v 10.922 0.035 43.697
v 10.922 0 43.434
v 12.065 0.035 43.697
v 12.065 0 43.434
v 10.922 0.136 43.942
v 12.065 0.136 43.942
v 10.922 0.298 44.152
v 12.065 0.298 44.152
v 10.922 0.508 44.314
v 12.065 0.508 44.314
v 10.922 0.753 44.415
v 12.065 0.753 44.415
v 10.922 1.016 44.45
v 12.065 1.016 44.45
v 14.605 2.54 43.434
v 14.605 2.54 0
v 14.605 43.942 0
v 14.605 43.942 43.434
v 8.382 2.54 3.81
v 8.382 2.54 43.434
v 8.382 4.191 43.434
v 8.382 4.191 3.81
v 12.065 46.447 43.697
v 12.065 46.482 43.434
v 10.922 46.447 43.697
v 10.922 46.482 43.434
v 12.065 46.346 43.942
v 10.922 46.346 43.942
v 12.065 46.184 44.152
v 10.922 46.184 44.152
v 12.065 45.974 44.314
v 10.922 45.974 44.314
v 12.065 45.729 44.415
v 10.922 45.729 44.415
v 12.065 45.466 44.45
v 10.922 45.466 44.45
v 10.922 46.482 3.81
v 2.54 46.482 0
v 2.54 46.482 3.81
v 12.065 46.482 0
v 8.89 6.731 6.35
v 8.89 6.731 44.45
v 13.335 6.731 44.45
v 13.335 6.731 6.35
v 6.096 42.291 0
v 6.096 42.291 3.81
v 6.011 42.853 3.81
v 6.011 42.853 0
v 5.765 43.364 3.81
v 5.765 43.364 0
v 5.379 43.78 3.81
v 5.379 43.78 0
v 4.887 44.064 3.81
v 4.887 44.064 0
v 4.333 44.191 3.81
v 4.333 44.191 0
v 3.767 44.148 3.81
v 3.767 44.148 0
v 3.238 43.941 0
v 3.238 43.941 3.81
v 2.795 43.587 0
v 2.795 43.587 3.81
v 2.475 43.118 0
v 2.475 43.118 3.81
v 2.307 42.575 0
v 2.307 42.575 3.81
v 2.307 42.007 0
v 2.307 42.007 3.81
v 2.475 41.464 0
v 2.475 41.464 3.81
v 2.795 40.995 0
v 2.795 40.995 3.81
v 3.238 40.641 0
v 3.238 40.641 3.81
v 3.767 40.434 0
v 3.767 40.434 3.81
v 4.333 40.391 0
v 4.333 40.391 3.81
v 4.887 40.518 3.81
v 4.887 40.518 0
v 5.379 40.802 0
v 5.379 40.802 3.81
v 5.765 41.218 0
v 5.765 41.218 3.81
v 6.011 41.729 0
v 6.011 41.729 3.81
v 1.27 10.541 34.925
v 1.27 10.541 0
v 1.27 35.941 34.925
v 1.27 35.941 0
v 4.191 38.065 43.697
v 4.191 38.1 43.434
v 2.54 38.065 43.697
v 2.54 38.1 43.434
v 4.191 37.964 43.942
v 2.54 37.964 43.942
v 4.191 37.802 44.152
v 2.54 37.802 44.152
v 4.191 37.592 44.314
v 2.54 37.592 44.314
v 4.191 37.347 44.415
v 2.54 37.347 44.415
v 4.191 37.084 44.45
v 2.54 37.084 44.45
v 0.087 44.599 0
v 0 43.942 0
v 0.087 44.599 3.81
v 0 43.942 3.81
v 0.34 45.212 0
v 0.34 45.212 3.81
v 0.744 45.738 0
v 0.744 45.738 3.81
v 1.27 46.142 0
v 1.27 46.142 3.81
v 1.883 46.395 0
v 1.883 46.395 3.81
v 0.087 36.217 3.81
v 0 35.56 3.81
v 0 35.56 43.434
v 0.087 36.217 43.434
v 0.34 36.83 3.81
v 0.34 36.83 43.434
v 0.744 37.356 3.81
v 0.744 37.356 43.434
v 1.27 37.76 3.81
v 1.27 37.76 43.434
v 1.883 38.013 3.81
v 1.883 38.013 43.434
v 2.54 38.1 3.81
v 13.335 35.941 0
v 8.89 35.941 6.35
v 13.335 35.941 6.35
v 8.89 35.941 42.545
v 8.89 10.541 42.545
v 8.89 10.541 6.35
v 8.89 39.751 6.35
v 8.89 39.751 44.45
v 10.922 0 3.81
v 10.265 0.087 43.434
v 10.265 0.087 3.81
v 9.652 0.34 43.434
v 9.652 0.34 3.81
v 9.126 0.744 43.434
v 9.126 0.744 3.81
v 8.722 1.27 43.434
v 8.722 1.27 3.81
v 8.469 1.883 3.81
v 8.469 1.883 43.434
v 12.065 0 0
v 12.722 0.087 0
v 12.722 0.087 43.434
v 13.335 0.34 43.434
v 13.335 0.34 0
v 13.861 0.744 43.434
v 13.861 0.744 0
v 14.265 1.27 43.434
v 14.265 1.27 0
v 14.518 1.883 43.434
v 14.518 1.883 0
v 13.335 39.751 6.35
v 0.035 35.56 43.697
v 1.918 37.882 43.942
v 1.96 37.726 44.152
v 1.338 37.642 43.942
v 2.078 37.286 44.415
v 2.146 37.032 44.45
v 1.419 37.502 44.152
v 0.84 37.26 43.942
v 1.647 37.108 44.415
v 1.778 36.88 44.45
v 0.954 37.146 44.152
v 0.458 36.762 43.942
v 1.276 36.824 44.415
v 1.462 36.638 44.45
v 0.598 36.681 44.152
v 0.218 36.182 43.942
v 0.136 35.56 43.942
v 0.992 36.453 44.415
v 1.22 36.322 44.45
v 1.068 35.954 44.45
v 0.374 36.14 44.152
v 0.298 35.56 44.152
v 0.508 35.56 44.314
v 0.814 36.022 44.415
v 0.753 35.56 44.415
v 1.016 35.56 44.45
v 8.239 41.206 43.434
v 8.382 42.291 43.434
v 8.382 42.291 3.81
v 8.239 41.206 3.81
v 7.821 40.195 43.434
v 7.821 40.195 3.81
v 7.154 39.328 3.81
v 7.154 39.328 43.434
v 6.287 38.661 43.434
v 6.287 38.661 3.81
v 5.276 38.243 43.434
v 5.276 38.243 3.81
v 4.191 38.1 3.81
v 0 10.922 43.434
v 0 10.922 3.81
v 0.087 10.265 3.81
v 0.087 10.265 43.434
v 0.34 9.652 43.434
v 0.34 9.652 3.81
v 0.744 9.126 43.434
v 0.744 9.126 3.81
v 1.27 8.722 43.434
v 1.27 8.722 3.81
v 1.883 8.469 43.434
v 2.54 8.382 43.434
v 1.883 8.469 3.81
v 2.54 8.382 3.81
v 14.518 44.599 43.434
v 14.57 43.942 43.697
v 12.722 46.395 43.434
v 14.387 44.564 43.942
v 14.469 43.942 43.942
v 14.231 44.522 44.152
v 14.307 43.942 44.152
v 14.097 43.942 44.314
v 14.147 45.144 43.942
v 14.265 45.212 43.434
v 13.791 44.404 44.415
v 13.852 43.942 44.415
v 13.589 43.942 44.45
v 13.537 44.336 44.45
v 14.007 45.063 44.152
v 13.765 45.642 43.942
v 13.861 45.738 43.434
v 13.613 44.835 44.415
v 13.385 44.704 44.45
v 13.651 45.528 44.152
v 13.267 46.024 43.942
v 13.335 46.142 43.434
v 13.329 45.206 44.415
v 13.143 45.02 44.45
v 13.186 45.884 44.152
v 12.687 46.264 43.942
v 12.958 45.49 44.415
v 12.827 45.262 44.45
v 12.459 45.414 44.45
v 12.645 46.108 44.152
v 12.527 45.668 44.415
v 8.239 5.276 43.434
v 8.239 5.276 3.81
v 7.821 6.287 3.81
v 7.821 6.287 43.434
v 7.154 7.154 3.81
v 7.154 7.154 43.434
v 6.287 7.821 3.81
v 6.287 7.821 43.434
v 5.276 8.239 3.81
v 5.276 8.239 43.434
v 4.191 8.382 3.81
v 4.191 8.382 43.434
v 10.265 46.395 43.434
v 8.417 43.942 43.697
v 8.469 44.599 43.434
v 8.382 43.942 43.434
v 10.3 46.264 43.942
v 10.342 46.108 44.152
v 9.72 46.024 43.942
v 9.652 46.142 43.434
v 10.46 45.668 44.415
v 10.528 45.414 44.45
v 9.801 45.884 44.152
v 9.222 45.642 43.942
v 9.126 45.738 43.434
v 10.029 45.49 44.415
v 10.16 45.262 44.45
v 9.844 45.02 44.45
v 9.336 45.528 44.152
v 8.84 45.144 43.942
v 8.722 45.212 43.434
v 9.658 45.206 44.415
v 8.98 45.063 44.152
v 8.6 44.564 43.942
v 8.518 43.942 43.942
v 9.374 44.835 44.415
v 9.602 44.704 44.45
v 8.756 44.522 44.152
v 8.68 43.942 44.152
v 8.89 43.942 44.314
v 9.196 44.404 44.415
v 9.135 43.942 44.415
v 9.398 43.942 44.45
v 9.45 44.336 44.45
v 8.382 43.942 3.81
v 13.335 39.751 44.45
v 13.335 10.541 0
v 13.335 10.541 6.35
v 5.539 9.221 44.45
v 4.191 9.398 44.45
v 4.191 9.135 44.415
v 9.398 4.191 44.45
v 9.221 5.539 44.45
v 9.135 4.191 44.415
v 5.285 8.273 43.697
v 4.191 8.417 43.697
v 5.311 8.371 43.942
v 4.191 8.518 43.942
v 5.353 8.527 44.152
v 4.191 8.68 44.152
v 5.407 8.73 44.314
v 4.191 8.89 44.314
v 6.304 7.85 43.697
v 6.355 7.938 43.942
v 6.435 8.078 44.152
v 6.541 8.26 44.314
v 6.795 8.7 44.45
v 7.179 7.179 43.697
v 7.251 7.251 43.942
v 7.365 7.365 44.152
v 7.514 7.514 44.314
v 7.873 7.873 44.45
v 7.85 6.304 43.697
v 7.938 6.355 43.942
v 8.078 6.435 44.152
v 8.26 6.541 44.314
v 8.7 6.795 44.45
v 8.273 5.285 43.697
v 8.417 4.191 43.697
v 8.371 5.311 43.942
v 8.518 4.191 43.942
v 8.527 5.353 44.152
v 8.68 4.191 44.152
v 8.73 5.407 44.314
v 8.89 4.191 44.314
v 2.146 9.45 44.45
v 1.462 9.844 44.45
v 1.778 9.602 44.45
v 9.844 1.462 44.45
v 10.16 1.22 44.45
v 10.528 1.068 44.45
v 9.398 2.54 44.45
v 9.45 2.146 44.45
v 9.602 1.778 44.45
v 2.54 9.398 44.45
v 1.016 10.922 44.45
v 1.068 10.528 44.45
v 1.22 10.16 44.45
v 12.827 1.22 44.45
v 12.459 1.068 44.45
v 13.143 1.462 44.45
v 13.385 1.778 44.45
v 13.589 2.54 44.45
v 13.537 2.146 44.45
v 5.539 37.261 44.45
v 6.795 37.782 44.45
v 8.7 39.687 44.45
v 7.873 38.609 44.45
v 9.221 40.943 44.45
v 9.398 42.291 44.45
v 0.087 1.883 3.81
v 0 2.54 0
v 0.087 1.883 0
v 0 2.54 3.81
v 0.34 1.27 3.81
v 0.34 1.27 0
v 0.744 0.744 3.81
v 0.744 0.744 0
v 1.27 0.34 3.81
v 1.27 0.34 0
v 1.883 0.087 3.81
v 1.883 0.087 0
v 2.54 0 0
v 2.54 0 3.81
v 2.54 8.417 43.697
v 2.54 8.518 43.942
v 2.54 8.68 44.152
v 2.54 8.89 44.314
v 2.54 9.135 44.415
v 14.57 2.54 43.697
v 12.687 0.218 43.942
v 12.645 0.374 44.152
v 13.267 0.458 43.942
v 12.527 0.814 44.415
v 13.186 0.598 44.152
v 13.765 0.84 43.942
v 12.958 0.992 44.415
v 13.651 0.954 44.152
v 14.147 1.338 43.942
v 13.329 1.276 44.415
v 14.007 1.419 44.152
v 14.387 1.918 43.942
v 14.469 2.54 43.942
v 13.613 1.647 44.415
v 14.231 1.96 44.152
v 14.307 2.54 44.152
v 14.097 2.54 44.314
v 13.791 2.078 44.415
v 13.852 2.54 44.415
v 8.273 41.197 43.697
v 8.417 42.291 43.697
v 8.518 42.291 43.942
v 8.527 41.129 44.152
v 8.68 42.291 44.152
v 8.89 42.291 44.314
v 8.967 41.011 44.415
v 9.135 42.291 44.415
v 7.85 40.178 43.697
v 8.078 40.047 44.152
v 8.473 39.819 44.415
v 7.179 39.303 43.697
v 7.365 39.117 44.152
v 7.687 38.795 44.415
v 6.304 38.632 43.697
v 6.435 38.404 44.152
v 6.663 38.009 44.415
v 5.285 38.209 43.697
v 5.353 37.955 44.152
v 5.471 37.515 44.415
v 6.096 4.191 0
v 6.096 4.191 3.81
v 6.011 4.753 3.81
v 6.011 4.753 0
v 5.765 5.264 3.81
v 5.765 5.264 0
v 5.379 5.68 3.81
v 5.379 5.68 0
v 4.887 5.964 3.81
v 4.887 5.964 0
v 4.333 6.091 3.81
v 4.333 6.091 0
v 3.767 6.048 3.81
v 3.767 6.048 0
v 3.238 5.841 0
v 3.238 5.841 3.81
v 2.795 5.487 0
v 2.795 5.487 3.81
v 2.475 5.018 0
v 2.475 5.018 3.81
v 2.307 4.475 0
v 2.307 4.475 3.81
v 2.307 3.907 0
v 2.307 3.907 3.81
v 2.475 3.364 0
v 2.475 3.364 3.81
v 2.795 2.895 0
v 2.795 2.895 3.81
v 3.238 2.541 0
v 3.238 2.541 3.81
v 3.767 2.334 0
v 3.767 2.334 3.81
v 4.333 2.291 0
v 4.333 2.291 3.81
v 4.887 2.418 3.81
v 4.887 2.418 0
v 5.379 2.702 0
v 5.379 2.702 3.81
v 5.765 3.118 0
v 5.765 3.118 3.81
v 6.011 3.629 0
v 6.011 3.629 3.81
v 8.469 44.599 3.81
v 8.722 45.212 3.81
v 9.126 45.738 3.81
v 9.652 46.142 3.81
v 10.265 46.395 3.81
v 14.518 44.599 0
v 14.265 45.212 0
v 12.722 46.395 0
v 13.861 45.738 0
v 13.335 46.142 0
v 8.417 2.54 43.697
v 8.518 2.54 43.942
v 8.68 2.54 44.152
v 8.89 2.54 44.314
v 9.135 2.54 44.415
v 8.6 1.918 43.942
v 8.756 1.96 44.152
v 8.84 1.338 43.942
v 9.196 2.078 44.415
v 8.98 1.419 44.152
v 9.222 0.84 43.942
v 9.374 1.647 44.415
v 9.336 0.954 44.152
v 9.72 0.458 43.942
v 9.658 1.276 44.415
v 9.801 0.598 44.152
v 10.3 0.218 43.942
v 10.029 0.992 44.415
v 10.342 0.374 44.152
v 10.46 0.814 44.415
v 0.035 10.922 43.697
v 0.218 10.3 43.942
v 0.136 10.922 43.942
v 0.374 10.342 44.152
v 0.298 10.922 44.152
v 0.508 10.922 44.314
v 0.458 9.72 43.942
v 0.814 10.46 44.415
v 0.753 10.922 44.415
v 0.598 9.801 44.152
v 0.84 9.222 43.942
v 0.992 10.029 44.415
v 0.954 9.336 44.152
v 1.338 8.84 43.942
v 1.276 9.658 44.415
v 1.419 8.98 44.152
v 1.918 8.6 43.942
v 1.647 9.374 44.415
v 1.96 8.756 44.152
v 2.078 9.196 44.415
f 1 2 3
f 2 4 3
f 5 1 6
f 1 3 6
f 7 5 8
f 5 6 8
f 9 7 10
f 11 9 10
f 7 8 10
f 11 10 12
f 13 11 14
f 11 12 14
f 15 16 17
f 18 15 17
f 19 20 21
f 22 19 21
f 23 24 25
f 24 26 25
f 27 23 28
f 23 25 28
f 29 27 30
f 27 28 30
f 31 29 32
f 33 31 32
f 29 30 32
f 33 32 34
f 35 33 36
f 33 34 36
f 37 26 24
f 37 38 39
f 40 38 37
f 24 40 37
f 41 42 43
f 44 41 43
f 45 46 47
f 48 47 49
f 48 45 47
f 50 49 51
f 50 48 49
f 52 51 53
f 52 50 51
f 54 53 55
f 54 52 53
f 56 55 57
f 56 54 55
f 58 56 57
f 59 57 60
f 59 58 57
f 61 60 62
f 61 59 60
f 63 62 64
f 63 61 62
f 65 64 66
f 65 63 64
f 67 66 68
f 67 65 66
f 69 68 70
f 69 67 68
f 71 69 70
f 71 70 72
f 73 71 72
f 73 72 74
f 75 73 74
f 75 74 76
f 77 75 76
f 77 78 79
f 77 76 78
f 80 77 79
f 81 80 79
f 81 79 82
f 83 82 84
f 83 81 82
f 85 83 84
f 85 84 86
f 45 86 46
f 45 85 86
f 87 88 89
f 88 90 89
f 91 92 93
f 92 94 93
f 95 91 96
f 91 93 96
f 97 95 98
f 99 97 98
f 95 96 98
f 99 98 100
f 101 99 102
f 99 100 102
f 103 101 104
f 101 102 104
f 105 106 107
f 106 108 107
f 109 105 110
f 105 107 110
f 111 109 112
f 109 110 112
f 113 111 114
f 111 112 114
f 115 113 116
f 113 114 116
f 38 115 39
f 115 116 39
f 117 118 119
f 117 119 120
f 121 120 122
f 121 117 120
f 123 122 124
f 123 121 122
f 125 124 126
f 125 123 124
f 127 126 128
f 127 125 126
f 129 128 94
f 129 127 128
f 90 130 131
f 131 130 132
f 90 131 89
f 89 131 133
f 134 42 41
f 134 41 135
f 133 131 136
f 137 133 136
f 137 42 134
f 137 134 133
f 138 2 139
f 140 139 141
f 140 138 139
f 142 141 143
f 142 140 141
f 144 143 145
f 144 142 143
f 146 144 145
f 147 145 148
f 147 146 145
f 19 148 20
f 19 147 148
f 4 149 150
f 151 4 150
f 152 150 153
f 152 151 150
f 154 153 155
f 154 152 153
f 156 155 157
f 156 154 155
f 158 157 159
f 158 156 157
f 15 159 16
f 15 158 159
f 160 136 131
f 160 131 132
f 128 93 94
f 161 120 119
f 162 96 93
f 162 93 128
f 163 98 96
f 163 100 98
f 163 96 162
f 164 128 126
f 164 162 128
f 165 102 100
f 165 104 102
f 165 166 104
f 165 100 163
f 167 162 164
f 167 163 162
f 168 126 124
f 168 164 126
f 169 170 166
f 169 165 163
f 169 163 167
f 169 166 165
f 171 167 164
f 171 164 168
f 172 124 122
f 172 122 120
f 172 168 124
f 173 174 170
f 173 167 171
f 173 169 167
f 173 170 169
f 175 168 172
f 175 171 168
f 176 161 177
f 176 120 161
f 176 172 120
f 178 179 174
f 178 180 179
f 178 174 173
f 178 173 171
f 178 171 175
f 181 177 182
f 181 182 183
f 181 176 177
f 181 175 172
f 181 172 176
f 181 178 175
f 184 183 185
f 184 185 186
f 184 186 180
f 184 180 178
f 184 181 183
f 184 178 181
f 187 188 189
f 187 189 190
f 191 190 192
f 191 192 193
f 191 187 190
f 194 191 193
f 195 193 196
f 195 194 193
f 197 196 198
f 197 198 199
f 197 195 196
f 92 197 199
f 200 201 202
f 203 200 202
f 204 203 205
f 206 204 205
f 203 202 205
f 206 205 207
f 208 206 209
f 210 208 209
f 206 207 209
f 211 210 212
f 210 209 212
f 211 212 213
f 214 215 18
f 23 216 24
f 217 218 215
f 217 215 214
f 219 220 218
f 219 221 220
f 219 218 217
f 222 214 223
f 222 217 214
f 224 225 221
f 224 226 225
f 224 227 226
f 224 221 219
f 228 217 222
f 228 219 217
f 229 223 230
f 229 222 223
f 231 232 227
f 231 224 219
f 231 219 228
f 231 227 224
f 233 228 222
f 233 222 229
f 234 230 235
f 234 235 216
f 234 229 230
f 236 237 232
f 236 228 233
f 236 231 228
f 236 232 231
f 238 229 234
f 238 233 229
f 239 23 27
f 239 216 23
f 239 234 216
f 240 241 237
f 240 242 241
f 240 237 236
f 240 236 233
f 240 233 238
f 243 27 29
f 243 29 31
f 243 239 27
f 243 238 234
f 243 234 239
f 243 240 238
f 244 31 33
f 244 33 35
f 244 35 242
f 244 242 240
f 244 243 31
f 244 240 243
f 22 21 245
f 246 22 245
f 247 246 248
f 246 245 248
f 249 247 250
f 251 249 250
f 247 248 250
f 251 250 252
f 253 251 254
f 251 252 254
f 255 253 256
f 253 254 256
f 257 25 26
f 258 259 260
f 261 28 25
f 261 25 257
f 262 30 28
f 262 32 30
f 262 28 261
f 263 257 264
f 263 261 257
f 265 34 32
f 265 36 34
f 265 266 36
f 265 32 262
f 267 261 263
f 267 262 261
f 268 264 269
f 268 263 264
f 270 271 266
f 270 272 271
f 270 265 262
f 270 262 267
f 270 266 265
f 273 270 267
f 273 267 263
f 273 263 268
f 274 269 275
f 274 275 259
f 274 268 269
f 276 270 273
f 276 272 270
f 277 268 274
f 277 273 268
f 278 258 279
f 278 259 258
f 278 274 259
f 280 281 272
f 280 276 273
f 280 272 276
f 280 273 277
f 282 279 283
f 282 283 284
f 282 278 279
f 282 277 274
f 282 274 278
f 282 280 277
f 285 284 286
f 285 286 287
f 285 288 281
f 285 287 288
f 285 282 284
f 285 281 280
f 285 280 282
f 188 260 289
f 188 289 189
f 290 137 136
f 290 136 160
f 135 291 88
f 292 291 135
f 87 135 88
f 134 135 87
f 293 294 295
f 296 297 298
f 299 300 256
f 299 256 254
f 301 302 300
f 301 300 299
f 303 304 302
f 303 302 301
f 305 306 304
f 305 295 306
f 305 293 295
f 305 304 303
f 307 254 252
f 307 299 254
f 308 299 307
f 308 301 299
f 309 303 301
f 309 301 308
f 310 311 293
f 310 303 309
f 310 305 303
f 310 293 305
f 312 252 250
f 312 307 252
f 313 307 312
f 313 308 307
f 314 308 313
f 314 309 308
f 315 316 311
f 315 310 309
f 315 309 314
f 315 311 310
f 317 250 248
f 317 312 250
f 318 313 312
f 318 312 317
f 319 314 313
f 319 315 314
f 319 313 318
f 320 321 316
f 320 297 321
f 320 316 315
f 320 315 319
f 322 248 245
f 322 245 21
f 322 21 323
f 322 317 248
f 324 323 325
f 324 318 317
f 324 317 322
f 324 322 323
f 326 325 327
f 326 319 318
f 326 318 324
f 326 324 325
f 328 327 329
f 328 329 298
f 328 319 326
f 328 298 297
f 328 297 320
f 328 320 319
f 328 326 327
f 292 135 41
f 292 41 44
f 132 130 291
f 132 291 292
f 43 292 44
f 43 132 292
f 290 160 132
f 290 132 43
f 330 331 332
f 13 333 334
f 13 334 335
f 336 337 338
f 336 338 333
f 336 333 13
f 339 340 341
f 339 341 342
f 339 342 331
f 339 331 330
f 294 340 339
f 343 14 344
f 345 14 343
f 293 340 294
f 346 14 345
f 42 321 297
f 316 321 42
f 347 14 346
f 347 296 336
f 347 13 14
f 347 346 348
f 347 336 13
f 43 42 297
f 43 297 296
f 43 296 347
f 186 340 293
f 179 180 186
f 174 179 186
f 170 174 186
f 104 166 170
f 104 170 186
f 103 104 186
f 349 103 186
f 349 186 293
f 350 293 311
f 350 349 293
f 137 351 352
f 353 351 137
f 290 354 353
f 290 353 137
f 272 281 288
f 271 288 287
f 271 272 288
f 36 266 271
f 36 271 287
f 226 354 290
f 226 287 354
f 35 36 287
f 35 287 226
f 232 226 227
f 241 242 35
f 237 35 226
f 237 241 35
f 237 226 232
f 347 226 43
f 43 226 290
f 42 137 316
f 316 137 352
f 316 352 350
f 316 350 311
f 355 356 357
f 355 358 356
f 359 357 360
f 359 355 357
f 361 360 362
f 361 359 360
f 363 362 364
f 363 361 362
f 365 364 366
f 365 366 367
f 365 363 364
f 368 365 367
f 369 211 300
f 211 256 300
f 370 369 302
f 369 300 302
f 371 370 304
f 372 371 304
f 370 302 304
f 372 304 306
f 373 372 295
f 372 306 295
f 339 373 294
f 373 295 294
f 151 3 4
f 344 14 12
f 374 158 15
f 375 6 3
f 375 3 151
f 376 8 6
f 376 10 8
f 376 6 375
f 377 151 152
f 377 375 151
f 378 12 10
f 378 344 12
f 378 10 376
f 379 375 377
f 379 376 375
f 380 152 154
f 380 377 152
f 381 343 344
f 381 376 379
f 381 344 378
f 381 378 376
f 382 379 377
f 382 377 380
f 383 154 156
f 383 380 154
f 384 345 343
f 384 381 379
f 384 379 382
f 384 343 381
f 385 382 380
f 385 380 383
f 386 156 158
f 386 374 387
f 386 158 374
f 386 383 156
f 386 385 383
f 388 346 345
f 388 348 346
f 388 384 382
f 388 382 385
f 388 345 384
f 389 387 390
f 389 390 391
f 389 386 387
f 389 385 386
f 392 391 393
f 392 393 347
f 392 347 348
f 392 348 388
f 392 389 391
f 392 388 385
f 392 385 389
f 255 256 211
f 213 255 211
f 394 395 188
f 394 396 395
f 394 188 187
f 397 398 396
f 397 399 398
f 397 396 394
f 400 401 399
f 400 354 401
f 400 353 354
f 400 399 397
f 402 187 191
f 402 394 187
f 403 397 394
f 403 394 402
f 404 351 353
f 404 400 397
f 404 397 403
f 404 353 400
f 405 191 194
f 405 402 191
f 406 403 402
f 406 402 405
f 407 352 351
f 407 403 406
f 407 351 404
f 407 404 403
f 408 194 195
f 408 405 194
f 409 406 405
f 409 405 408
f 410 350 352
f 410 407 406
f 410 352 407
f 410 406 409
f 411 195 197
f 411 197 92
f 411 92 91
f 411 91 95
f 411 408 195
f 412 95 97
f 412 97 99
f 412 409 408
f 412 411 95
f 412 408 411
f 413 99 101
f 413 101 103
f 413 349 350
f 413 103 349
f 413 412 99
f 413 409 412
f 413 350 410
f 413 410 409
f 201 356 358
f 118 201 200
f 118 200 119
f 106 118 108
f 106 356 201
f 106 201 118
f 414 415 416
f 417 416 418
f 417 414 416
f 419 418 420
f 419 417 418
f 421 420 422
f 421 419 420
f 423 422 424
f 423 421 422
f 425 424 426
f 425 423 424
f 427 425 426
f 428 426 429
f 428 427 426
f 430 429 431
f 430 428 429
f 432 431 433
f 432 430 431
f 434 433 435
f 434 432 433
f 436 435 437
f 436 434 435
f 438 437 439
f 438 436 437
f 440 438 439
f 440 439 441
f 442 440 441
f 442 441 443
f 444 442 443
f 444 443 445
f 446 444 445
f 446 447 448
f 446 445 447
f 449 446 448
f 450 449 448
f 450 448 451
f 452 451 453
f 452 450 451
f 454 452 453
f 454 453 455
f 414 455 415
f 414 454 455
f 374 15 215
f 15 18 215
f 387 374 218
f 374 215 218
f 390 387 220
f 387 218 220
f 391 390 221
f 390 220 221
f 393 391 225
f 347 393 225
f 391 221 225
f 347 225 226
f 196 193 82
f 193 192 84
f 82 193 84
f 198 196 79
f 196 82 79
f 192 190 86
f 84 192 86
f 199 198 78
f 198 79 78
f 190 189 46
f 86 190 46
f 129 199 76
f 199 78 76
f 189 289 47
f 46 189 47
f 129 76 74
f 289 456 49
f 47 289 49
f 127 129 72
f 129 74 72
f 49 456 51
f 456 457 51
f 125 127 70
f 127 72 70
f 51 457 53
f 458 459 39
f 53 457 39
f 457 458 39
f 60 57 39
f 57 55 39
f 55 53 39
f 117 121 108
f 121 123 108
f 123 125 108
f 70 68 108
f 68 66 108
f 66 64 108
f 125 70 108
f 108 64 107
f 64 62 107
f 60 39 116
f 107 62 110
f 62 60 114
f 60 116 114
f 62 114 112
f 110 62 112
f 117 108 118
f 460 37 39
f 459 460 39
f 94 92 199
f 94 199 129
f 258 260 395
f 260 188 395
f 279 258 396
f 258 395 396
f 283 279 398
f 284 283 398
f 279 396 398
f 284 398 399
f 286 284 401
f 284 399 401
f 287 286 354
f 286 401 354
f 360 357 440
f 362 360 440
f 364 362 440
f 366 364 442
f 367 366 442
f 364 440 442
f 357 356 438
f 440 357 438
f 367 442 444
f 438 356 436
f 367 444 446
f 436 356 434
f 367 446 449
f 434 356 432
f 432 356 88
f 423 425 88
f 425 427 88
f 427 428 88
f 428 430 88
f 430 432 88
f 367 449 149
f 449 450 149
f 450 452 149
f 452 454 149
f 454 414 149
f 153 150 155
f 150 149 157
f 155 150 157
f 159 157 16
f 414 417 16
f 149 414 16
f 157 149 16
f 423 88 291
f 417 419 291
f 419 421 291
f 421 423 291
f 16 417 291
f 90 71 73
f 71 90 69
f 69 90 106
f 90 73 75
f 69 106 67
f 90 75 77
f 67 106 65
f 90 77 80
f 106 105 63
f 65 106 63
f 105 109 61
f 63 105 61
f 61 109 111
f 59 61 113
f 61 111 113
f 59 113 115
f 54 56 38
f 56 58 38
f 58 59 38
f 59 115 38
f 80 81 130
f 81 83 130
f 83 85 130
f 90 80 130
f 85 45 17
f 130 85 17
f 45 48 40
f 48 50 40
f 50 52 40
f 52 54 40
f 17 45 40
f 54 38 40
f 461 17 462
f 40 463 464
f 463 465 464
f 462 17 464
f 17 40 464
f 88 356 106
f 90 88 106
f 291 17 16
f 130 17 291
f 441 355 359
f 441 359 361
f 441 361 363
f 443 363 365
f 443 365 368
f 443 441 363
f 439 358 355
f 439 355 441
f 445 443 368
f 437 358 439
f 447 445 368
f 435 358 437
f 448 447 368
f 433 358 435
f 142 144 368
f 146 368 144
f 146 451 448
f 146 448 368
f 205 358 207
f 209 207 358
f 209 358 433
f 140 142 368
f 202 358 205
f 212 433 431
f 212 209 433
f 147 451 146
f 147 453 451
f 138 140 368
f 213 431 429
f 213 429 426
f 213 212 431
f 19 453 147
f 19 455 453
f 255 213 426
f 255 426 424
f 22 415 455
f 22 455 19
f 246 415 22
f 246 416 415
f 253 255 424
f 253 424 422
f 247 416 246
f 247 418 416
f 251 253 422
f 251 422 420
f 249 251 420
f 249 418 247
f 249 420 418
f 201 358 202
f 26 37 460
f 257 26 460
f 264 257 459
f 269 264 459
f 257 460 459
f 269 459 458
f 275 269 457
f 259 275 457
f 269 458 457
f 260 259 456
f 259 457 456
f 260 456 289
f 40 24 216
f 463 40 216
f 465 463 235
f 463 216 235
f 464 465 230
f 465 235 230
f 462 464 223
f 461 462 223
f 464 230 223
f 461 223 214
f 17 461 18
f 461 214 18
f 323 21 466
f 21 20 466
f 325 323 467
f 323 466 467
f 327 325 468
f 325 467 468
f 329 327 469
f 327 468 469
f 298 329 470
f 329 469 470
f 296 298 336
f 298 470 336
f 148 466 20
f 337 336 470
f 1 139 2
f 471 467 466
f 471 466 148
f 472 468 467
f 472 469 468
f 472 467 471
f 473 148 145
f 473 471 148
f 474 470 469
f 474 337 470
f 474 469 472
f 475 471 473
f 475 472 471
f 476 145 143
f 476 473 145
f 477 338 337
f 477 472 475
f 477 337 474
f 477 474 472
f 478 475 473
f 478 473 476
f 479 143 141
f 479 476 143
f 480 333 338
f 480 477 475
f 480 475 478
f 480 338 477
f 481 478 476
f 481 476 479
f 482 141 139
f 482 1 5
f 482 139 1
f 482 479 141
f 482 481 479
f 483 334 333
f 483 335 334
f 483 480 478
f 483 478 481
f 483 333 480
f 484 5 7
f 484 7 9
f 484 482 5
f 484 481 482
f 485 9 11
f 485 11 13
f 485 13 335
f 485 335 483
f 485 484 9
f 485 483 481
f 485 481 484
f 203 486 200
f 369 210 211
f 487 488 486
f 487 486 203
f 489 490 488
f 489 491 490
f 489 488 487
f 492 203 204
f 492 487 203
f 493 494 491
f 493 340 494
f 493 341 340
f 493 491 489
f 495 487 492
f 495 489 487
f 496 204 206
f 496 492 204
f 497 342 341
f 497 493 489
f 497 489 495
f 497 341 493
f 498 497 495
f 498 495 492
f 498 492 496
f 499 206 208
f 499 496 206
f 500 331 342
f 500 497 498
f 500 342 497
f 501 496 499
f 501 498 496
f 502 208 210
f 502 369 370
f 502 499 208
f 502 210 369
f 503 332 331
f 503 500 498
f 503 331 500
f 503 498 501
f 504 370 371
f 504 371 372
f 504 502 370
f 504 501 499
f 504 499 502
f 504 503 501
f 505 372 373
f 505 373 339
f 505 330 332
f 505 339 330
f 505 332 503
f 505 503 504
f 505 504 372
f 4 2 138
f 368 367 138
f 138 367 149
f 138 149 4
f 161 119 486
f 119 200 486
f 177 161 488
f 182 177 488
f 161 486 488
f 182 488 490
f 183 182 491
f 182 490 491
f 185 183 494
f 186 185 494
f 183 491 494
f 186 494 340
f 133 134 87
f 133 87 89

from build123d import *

# Parameters (mm, degrees)
SKETCH1_W           = 14.605
SKETCH1_H           = 46.482
SKETCH1_R           = 1.905
BOSS_EXTRUDE1_DEPTH = 44.45
SKETCH2_W           = 4.445
SKETCH2_H           = 33.02
CUT_EXTRUDE1_DEPTH  = 38.1
SKETCH3_W           = 42.545
SKETCH3_H           = 25.4
CUT_EXTRUDE2_DEPTH  = 12.065
CUT_EXTRUDE3_DEPTH  = 40.64
FILLET1_R           = 2.54
FILLET2_R           = 1.016
CHAMFER1_SIZE       = 7.62


with BuildPart() as part:
    # Sketch1 → Boss-Extrude1 (new body)
    with BuildSketch(Plane.XY):
        with Locations((7.3025, 23.241)):
            Rectangle(SKETCH1_W, SKETCH1_H)
        with Locations((4.191, 42.291)):
            Circle(SKETCH1_R, mode=Mode.SUBTRACT)
        with Locations((4.191, 4.191)):
            Circle(SKETCH1_R, mode=Mode.SUBTRACT)
    extrude(amount=BOSS_EXTRUDE1_DEPTH)

    # Sketch2 → Cut-Extrude1 (cut)
    with BuildSketch(Plane.XY.offset(44.45)):
        with Locations((11.1125, 23.241)):
            Rectangle(SKETCH2_W, SKETCH2_H)
    extrude(amount=-CUT_EXTRUDE1_DEPTH, mode=Mode.SUBTRACT)

    # Sketch3 → Cut-Extrude2 (cut)
    with BuildSketch(Plane.ZY.offset(-13.335)):
        with Locations((21.2725, 23.241)):
            Rectangle(SKETCH3_W, SKETCH3_H)
    extrude(amount=CUT_EXTRUDE2_DEPTH, mode=Mode.SUBTRACT)

    # Sketch4 → Cut-Extrude3 (cut)
    with BuildSketch(Plane.XY.offset(44.45)):
        with BuildLine():
            Line((4.191, 38.1), (0, 38.1))
            Line((0, 38.1), (0, 46.482))
            Line((0, 46.482), (8.382, 46.482))
            Line((8.382, 46.482), (8.382, 42.291))
            ThreePointArc((8.382, 42.291), (7.15448452, 39.32751548), (4.191, 38.1))
        make_face()
        with BuildLine():
            Line((4.191, 8.382), (0, 8.382))
            Line((0, 8.382), (0, 0))
            Line((0, 0), (8.382, 0))
            Line((8.382, 0), (8.382, 4.191))
            ThreePointArc((8.382, 4.191), (7.15448452, 7.15448452), (4.191, 8.382))
        make_face()
    extrude(amount=-CUT_EXTRUDE3_DEPTH, mode=Mode.SUBTRACT)

    # Fillet1
    fillet1_edges = [part.edges().sort_by_distance(p)[0] for p in [
        (0, 46.482, 1.905),
        (8.382, 46.482, 24.13),
        (0, 38.1, 24.13),
        (14.605, 46.482, 22.225),
        (0, 0, 1.905),
        (14.605, 0, 22.225),
        (8.382, 0, 24.13),
        (0, 8.382, 24.13),
    ]]
    fillet(fillet1_edges, radius=FILLET1_R)

    # Fillet2
    fillet2_edges = [part.edges().sort_by_distance(p)[0] for p in [
        (3.3655, 38.1, 44.45),
        (0, 23.241, 44.45),
        (13.861051224, 45.738051224, 44.45),
        (13.861051224, 0.743948776, 44.45),
        (9.125948776, 0.743948776, 44.45),
        (0.743948776, 9.125948776, 44.45),
        (0.743948776, 37.356051224, 44.45),
        (9.125948776, 45.738051224, 44.45),
        (7.15448452, 39.32751548, 44.45),
        (8.382, 43.1165, 44.45),
        (7.15448452, 7.15448452, 44.45),
        (3.3655, 8.382, 44.45),
        (11.4935, 46.482, 44.45),
        (8.382, 3.3655, 44.45),
        (11.4935, 0, 44.45),
        (14.605, 23.241, 44.45),
    ]]
    fillet(fillet2_edges, radius=FILLET2_R)

    # Chamfer1
    chamfer1_edges = [part.edges().sort_by_distance(p)[0] for p in [
        (1.27, 23.241, 42.545),
    ]]
    chamfer(chamfer1_edges, length=CHAMFER1_SIZE - 0.0001)  # a hair under: the kernel refuses the full size


solid = part.part
